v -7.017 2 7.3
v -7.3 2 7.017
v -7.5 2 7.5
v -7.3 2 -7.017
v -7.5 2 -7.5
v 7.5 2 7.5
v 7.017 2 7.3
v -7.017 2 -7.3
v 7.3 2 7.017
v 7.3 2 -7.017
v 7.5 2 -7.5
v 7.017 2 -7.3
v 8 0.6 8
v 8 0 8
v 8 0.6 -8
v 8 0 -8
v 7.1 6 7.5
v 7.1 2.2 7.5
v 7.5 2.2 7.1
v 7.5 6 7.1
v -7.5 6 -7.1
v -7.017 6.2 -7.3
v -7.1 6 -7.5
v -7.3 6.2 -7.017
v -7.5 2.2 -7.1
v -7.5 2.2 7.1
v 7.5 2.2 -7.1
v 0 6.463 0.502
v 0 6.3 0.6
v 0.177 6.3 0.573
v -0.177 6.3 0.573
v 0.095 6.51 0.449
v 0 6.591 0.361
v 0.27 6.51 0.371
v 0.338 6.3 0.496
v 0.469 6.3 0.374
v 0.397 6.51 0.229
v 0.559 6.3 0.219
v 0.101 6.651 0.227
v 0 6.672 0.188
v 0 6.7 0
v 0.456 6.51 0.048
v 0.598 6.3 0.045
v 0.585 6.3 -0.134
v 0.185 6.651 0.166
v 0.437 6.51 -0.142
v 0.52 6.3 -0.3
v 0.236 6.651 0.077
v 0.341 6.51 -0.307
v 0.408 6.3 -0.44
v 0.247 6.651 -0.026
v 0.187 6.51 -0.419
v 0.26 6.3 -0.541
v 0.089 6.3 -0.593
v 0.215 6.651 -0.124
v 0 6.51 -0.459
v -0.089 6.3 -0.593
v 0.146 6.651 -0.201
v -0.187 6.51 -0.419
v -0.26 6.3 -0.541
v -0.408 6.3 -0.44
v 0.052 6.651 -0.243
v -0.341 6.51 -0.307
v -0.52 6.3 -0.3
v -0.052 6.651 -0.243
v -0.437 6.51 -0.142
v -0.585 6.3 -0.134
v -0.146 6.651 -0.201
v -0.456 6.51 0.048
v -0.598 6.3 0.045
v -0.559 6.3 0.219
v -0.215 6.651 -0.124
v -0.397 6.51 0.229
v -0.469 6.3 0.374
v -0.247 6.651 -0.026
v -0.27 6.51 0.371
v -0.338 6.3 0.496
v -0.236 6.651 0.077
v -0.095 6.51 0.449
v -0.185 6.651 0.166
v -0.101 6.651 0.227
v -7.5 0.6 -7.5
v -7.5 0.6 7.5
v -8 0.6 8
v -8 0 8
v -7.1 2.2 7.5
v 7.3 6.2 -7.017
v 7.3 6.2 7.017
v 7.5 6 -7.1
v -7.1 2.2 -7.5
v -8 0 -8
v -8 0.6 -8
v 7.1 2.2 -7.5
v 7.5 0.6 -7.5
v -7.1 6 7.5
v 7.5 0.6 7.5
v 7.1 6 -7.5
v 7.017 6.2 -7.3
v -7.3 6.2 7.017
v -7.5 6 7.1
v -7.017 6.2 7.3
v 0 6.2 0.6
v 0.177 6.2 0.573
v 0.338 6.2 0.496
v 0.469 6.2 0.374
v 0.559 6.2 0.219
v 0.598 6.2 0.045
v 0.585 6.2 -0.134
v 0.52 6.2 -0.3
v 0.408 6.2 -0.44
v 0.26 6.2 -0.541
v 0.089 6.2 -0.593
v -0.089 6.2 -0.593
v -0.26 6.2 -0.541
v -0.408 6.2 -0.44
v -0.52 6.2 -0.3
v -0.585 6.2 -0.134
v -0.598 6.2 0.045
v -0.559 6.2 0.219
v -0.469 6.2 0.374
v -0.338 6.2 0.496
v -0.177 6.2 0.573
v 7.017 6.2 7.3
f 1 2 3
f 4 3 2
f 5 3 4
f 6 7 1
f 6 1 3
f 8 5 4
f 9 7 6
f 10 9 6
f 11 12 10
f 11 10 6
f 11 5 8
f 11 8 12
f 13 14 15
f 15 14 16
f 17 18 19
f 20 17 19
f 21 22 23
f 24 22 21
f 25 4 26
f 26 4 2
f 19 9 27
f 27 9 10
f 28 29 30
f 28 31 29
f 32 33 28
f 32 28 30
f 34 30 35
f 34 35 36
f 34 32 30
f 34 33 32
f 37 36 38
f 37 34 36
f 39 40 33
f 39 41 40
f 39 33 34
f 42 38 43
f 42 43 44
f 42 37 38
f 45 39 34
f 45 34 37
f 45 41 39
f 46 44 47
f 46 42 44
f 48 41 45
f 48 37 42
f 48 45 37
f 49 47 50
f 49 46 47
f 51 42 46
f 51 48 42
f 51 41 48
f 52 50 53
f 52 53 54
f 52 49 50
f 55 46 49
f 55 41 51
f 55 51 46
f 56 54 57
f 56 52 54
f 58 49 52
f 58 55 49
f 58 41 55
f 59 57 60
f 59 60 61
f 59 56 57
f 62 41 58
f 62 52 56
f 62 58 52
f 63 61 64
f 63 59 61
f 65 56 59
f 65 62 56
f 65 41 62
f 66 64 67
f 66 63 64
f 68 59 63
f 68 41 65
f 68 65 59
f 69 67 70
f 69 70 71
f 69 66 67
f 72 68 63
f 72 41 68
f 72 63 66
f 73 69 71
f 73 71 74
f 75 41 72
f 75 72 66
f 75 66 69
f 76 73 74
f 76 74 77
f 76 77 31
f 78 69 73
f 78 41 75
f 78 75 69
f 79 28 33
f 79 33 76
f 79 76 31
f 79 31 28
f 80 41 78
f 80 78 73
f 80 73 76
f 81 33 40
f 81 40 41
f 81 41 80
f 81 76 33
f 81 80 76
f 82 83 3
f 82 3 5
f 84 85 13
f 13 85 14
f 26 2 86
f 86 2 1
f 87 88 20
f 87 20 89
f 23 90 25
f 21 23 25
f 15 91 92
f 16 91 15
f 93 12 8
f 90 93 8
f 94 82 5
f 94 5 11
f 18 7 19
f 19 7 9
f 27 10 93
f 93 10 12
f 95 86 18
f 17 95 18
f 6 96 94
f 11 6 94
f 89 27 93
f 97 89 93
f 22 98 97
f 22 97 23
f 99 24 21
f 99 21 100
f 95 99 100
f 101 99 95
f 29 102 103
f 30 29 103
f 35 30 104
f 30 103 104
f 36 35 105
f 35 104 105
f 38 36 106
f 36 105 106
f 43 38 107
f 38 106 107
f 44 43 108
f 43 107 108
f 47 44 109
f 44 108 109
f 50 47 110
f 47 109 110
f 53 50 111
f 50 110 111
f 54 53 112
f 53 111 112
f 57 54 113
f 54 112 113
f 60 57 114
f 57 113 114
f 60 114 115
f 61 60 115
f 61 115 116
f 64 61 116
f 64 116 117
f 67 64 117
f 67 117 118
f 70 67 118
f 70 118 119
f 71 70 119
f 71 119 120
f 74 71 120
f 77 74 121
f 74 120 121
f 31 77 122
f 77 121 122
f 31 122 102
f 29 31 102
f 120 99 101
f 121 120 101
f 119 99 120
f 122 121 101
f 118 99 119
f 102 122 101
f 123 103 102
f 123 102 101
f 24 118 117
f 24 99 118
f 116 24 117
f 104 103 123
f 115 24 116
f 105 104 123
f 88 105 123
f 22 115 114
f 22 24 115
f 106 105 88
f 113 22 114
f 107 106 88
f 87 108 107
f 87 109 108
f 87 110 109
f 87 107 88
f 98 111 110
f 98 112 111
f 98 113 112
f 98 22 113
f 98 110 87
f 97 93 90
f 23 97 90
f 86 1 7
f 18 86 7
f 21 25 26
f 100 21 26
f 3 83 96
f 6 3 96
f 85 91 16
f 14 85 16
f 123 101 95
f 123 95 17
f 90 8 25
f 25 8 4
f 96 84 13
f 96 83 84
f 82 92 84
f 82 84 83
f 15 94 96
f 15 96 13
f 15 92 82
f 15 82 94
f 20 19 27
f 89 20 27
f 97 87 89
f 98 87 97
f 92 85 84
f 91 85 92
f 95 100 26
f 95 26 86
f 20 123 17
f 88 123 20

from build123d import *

# Parameters (mm, degrees)
SKETCH1_W           = 16
SKETCH1_H           = 16
BOSS_EXTRUDE1_DEPTH = 0.6
SKETCH2_W           = 15
SKETCH2_H           = 15
BOSS_EXTRUDE2_DEPTH = 1.4
BOSS_EXTRUDE3_DEPTH = 4.2
CHAMFER1_SIZE       = 0.2
SKETCH4_R           = 0.6
BOSS_EXTRUDE4_DEPTH = 0.1
DOME1_FACE_RADIUS   = 0.6
DOME1_HEIGHT        = 0.4


with BuildPart() as part:
    # Sketch1 → Boss-Extrude1 (new body)
    with BuildSketch(Plane(origin=(0, 0, 0), x_dir=(1, 0, 0), z_dir=(0, 1, 0))):
        Rectangle(SKETCH1_W, SKETCH1_H)
    extrude(amount=BOSS_EXTRUDE1_DEPTH)

    # Sketch2 → Boss-Extrude2 (add)
    with BuildSketch(Plane(origin=(0, 0.6, 0), x_dir=(1, 0, 0), z_dir=(0, 1, 0))):
        Rectangle(SKETCH2_W, SKETCH2_H)
    extrude(amount=BOSS_EXTRUDE2_DEPTH)


with BuildPart() as body_2:
    # Sketch3 → Boss-Extrude3 (new body)
    with BuildSketch(Plane(origin=(0, 2, 0), x_dir=(1, 0, 0), z_dir=(0, 1, 0))):
        Polygon((-7.1, 7.5), (-7.5, 7.1), (-7.5, -7.1), (-7.1, -7.5), (7.1, -7.5), (7.5, -7.1), (7.5, 7.1), (7.1, 7.5), align=None)
    extrude(amount=BOSS_EXTRUDE3_DEPTH)

    # Chamfer1
    chamfer1_edges = [body_2.edges().sort_by_distance(p)[0] for p in [
        (0, 6.2, 7.5),
        (-7.3, 2, 7.3),
        (-7.5, 2, 0),
        (7.3, 6.2, 7.3),
        (7.5, 6.2, 0),
        (7.3, 6.2, -7.3),
        (0, 6.2, -7.5),
        (-7.3, 6.2, -7.3),
        (-7.5, 6.2, 0),
        (-7.3, 6.2, 7.3),
        (-7.3, 2, -7.3),
        (0, 2, -7.5),
        (7.3, 2, -7.3),
        (7.5, 2, 0),
        (7.3, 2, 7.3),
        (0, 2, 7.5),
    ]]
    chamfer(chamfer1_edges, length=CHAMFER1_SIZE)

    # Combine1: union part
    add(part.part)

    # Sketch4 → Boss-Extrude4 (add)
    with BuildSketch(Plane(origin=(0, 6.2, 0), x_dir=(1, 0, 0), z_dir=(0, 1, 0))):
        with Locations(Location((0, 0, 0), (0, 0, 270))):
            Circle(SKETCH4_R)
    extrude(amount=BOSS_EXTRUDE4_DEPTH)

    # Dome1: a dome of height H over a round flat face of radius A is a cap of a sphere of radius (A * A + H * H) / (2 * H)
    dome1_r = (DOME1_FACE_RADIUS * DOME1_FACE_RADIUS + DOME1_HEIGHT * DOME1_HEIGHT) / (2 * DOME1_HEIGHT)
    dome1_base = Plane((0, 6.3, 0), z_dir=(0, 1, 0))
    with Locations(dome1_base.offset(DOME1_HEIGHT - dome1_r)):
        dome1_ball = Sphere(dome1_r, mode=Mode.PRIVATE)
    add(split(dome1_ball, bisect_by=dome1_base, keep=Keep.TOP, mode=Mode.PRIVATE))


solid = body_2.part
